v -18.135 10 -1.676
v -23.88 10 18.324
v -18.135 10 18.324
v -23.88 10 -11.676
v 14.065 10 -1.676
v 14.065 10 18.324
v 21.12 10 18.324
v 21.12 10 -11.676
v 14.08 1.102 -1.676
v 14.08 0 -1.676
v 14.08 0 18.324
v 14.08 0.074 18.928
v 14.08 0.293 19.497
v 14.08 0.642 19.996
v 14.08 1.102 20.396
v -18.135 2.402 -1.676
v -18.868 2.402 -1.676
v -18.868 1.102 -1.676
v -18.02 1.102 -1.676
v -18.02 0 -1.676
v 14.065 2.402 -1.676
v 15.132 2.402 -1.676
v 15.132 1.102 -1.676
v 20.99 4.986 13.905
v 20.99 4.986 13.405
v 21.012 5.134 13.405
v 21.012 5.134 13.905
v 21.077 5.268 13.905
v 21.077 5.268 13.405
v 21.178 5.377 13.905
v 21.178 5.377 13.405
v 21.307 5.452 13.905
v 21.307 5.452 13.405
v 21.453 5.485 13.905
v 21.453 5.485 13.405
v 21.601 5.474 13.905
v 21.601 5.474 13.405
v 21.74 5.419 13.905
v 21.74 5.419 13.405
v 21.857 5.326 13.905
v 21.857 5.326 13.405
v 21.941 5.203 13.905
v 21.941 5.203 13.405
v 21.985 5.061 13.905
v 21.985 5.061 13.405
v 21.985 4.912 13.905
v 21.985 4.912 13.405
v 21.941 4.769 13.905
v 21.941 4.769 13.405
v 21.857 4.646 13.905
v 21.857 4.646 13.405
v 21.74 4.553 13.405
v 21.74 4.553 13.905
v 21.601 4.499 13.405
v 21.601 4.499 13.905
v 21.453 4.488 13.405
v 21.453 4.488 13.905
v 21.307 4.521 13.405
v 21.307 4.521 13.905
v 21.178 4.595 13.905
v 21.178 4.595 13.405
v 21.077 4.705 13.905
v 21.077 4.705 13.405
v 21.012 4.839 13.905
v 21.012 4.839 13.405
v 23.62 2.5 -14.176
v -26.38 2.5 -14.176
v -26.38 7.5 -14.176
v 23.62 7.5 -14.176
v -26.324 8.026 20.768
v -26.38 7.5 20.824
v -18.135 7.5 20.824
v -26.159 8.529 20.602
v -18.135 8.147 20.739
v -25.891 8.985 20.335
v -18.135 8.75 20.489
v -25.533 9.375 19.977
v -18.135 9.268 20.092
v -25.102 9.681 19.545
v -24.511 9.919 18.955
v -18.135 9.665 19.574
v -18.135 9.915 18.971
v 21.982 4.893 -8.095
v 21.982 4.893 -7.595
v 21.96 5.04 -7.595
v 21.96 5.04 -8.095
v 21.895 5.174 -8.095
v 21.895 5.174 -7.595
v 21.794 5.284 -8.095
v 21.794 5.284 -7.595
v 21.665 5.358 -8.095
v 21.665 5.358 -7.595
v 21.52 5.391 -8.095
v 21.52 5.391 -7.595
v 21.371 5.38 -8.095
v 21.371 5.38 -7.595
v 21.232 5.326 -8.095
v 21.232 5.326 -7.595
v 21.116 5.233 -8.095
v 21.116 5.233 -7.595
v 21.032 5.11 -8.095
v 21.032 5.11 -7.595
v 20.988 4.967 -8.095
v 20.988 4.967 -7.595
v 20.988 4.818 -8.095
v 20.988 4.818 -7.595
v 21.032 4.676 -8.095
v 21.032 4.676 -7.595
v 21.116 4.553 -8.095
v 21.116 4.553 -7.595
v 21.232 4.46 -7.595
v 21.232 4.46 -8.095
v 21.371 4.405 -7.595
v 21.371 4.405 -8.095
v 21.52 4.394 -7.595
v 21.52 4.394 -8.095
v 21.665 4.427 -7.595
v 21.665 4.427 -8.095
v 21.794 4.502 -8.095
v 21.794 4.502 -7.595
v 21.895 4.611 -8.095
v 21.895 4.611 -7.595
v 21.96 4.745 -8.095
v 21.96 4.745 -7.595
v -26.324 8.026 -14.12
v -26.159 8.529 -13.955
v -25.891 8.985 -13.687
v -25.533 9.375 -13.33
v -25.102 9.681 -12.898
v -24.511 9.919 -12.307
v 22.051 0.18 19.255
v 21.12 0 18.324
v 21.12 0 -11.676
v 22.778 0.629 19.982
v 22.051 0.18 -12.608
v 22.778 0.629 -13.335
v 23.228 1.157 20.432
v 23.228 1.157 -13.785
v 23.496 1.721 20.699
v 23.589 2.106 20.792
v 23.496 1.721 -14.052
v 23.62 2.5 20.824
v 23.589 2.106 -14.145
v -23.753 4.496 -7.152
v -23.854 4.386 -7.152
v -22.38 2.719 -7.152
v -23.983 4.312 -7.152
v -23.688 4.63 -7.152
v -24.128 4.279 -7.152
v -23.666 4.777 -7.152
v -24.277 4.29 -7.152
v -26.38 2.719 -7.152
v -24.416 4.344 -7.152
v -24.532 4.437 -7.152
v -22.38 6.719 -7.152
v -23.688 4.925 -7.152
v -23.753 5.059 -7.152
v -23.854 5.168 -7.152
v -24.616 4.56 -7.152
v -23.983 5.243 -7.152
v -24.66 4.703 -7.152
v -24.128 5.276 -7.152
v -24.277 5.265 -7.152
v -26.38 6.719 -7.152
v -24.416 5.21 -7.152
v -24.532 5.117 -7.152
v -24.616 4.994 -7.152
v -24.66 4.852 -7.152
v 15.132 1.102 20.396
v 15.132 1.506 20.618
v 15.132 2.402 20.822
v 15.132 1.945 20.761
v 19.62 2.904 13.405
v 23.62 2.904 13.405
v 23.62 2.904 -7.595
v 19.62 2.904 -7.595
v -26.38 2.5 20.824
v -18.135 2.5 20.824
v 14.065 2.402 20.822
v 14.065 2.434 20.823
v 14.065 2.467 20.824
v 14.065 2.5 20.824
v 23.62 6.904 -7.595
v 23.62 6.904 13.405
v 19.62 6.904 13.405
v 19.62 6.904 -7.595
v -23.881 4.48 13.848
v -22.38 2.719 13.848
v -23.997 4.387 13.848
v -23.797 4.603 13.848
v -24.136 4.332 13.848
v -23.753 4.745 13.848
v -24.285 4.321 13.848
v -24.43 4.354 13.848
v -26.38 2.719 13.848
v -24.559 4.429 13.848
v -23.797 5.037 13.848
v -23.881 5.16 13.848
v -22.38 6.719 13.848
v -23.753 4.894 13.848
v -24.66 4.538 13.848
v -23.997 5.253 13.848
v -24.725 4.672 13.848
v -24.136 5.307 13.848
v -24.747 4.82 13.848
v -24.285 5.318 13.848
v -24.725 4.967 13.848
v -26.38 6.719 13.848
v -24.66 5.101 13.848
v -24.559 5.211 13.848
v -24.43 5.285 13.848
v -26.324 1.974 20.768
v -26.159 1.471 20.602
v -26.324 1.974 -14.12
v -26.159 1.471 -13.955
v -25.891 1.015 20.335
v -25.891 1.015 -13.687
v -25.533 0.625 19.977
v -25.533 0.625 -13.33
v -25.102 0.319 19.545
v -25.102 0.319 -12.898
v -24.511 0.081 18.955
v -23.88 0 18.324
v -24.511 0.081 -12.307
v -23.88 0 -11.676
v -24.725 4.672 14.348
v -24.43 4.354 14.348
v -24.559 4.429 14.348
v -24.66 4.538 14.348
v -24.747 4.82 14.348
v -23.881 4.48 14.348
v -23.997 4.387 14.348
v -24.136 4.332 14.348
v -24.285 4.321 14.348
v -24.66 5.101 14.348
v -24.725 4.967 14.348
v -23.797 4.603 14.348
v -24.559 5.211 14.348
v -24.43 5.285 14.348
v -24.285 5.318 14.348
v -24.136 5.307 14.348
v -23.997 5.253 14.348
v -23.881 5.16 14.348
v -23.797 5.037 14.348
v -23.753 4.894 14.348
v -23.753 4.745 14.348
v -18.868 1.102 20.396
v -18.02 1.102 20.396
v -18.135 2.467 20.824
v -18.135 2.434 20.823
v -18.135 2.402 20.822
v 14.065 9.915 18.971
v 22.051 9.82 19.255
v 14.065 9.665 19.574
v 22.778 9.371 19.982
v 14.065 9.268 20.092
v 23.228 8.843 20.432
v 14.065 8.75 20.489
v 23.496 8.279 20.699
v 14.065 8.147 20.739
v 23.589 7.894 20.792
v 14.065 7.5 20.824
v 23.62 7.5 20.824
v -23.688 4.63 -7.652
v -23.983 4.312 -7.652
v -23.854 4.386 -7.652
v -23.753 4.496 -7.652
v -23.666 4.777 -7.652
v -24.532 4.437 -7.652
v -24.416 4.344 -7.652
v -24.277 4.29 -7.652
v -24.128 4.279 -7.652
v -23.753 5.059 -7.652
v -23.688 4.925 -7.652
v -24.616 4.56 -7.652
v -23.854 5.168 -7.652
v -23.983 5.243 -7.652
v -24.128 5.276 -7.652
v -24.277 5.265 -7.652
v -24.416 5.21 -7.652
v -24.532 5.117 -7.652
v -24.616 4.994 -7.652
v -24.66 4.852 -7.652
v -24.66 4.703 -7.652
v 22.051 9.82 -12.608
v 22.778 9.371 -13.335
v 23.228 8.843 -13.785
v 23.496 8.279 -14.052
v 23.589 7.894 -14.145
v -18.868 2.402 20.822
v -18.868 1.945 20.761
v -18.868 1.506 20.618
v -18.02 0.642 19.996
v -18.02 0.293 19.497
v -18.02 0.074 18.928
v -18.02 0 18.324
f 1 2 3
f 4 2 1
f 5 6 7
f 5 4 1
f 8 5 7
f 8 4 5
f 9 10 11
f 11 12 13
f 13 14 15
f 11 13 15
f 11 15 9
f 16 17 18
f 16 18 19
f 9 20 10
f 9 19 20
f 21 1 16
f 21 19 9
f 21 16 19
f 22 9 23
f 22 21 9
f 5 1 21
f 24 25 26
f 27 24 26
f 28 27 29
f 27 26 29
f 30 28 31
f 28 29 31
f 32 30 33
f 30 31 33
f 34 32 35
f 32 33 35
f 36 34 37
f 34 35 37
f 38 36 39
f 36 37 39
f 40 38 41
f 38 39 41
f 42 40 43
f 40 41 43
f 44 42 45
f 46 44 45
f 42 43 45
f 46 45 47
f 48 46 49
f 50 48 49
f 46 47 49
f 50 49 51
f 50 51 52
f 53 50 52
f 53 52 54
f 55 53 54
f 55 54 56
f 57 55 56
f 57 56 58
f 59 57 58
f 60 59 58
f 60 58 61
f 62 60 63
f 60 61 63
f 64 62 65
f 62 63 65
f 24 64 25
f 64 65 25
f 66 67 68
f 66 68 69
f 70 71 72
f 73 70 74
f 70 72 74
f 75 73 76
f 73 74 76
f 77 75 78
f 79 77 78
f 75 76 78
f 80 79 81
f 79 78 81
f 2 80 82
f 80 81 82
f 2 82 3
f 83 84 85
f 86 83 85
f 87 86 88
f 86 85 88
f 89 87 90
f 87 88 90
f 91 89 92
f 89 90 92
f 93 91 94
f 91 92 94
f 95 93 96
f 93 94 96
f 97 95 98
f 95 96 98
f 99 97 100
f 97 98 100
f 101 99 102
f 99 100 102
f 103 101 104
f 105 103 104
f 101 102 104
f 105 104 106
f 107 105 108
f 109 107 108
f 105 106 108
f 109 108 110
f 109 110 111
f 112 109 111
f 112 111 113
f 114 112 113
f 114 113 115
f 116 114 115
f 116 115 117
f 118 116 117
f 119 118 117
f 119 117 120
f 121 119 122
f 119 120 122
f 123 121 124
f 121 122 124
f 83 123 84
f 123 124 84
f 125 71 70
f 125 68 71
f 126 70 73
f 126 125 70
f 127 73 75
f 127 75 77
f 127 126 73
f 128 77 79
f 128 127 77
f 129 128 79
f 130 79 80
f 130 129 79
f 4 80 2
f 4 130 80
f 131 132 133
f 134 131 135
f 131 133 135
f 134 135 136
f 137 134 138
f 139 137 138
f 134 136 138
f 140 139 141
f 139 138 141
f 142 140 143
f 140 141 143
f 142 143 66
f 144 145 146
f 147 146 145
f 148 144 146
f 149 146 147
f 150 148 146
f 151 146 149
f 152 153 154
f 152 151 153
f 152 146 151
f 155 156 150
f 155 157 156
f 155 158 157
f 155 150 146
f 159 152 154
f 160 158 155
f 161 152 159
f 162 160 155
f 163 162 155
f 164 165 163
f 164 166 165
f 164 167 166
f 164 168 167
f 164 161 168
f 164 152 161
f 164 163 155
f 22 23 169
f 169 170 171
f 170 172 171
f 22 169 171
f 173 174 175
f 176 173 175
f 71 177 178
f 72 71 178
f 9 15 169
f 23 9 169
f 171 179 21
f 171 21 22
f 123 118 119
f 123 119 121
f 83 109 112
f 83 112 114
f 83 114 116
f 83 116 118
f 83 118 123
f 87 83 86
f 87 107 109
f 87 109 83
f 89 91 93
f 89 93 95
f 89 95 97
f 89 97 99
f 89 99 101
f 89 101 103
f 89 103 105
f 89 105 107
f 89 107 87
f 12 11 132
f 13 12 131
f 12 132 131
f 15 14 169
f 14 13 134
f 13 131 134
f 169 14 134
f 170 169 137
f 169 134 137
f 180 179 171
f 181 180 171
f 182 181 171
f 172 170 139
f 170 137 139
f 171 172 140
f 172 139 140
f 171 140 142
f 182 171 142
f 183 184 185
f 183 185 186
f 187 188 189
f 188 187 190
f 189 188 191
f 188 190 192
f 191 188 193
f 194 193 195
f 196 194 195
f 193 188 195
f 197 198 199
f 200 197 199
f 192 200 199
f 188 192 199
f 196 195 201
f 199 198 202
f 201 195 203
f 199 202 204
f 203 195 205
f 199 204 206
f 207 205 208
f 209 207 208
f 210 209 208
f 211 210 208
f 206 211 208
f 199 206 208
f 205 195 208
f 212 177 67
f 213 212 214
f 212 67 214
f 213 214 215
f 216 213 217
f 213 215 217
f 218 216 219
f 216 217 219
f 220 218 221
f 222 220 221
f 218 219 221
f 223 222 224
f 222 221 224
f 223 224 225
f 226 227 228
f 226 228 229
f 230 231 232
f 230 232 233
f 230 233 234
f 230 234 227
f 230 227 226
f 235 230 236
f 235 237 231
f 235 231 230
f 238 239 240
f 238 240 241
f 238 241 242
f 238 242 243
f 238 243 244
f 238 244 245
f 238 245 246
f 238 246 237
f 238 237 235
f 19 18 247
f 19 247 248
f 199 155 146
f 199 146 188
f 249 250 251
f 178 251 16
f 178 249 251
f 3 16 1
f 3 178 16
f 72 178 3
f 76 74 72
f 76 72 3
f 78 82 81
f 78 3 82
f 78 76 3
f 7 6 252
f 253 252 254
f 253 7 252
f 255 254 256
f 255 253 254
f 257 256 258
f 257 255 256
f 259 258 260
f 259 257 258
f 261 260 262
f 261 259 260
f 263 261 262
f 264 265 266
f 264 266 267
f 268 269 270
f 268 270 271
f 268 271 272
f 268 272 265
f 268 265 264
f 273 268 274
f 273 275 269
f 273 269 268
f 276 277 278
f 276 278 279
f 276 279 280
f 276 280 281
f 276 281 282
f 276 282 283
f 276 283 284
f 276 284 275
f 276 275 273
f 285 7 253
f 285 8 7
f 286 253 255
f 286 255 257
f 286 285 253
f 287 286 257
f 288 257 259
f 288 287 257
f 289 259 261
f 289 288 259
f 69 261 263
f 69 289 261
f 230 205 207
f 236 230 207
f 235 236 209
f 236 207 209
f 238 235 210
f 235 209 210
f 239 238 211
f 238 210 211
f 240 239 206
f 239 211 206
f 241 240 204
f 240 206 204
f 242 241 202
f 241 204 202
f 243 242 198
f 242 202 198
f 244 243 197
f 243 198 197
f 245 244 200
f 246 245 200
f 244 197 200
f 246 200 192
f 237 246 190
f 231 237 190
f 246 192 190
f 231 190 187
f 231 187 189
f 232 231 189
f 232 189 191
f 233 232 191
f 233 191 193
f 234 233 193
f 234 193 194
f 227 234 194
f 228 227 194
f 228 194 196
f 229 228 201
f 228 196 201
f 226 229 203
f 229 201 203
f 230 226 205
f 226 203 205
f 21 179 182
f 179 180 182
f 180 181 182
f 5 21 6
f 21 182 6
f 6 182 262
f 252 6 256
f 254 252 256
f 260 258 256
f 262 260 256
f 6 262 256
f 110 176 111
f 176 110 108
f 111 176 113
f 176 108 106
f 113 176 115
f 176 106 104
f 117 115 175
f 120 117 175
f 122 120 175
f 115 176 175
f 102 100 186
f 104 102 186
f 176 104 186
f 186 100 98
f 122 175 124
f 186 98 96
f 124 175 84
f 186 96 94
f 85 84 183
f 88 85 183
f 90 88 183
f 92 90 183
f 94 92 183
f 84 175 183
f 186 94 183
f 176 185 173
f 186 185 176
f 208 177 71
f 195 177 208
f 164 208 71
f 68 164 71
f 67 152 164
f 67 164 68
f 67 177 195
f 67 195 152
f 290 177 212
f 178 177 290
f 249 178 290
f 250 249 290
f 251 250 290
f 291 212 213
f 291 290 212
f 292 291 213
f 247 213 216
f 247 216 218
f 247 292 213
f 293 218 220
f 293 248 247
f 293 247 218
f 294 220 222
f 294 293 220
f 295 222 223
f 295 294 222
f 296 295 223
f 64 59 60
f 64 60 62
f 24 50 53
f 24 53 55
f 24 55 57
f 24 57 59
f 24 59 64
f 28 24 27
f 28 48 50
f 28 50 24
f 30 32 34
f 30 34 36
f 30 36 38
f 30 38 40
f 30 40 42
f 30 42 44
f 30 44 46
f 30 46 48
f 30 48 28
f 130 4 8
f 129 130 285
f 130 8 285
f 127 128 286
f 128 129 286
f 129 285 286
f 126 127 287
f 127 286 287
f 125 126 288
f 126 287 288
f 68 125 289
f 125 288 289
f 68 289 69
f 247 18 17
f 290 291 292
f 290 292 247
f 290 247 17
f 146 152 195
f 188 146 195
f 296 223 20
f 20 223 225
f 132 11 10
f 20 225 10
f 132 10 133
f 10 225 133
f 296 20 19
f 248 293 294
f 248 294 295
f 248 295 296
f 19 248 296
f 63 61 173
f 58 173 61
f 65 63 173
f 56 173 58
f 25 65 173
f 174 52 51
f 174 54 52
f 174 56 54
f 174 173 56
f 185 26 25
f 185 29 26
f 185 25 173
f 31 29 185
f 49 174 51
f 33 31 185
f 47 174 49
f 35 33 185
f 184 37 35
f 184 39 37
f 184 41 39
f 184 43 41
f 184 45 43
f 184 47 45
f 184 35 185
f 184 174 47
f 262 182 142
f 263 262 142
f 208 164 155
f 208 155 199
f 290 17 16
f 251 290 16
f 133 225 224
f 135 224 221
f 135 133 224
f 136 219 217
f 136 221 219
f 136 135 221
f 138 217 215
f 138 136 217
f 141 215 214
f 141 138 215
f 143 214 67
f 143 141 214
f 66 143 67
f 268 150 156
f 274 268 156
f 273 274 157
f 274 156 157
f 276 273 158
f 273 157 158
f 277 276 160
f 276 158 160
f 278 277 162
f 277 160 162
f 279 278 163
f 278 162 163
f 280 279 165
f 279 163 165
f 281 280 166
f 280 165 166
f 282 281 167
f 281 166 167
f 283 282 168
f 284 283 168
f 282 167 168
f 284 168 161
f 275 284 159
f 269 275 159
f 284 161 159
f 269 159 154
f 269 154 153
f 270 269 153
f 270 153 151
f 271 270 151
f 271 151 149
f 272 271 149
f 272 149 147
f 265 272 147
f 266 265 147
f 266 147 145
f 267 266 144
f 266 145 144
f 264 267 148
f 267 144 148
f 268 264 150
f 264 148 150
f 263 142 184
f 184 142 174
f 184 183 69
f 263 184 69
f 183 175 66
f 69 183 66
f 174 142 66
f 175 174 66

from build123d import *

# Parameters (mm, degrees)
SKETCH1_W           = 50
SKETCH1_H           = 35
BOSS_EXTRUDE1_DEPTH = 10
SKETCH2_W           = 34
SKETCH2_H           = 1.3
CUT_EXTRUDE1_DEPTH  = 22.5
SKETCH3_W           = 15
SKETCH3_H           = 7.598280995
CUT_EXTRUDE2_DEPTH  = 22.5
SKETCH4_W           = 17.2
SKETCH4_H           = 7.598280995
CUT_EXTRUDE3_DEPTH  = 22.5
SKETCH5_W           = 13.5
SKETCH5_H           = 1.101719005
CUT_EXTRUDE4_DEPTH  = 22.5
SKETCH6_W           = 18.6
SKETCH6_H           = 1.101719005
CUT_EXTRUDE5_DEPTH  = 22.5
SKETCH7_W           = 21
SKETCH7_H           = 4
CUT_EXTRUDE6_DEPTH  = 4
SKETCH8_R           = 0.5
CUT_EXTRUDE7_DEPTH  = 0.5
SKETCH9_R           = 0.5
CUT_EXTRUDE8_DEPTH  = 0.5
SKETCH10_W          = 21
SKETCH10_H          = 4
CUT_EXTRUDE9_DEPTH  = 4
SKETCH11_R          = 0.5
CUT_EXTRUDE10_DEPTH = 0.5
SKETCH12_R          = 0.5
CUT_EXTRUDE11_DEPTH = 0.5
FILLET1_R           = 2.5


with BuildPart() as part:
    # Sketch1 → Boss-Extrude1 (new body)
    with BuildSketch(Plane(origin=(0, 0, 0), x_dir=(1, 0, 0), z_dir=(0, 1, 0))):
        with Locations((-1.379996057, -3.323754789)):
            Rectangle(SKETCH1_W, SKETCH1_H)
    extrude(amount=BOSS_EXTRUDE1_DEPTH)

    # Sketch2 → Cut-Extrude1 (cut)
    with BuildSketch(Plane.XY.offset(20.823754789)):
        with Locations((-1.867795916, 1.751719005)):
            Rectangle(SKETCH2_W, SKETCH2_H)
    extrude(amount=-CUT_EXTRUDE1_DEPTH, mode=Mode.SUBTRACT)

    # Sketch3 → Cut-Extrude2 (cut)
    with BuildSketch(Plane.XY.offset(20.823754789)):
        with Locations((6.564825068, 6.200859503)):
            Rectangle(SKETCH3_W, SKETCH3_H)
    extrude(amount=-CUT_EXTRUDE2_DEPTH, mode=Mode.SUBTRACT)

    # Sketch4 → Cut-Extrude3 (cut)
    with BuildSketch(Plane.XY.offset(20.823754789)):
        with Locations((-9.535174932, 6.200859503)):
            Rectangle(SKETCH4_W, SKETCH4_H)
    extrude(amount=-CUT_EXTRUDE3_DEPTH, mode=Mode.SUBTRACT)

    # Sketch5 → Cut-Extrude4 (cut)
    with BuildSketch(Plane.XY.offset(20.823754789)):
        with Locations((7.329591682, 0.550859503)):
            Rectangle(SKETCH5_W, SKETCH5_H)
    extrude(amount=-CUT_EXTRUDE4_DEPTH, mode=Mode.SUBTRACT)

    # Sketch6 → Cut-Extrude5 (cut)
    with BuildSketch(Plane.XY.offset(20.823754789)):
        with Locations((-8.720408318, 0.550859503)):
            Rectangle(SKETCH6_W, SKETCH6_H)
    extrude(amount=-CUT_EXTRUDE5_DEPTH, mode=Mode.SUBTRACT)

    # Sketch7 → Cut-Extrude6 (cut)
    with BuildSketch(Plane.ZY.offset(26.379996057)):
        with Locations((3.348440288, 4.718765764)):
            Rectangle(SKETCH7_W, SKETCH7_H)
    extrude(amount=-CUT_EXTRUDE6_DEPTH, mode=Mode.SUBTRACT)

    # Sketch8 → Cut-Extrude7 (cut)
    with BuildSketch(Plane.XY.offset(-7.151559712)):
        with Locations((-24.165741094, 4.777186657)):
            Circle(SKETCH8_R)
    extrude(amount=-CUT_EXTRUDE7_DEPTH, mode=Mode.SUBTRACT)

    # Sketch9 → Cut-Extrude8 (cut)
    with BuildSketch(Plane(origin=(0, 0, 13.848440288), x_dir=(-1, 0, 0), z_dir=(0, 0, -1))):
        with Locations((24.247358315, 4.819765538)):
            Circle(SKETCH9_R)
    extrude(amount=-CUT_EXTRUDE8_DEPTH, mode=Mode.SUBTRACT)

    # Sketch10 → Cut-Extrude9 (cut)
    with BuildSketch(Plane(origin=(23.620003943, 0, 0), x_dir=(0, 0, -1), z_dir=(1, 0, 0))):
        with Locations((-2.904513536, 4.904491876)):
            Rectangle(SKETCH10_W, SKETCH10_H)
    extrude(amount=-CUT_EXTRUDE9_DEPTH, mode=Mode.SUBTRACT)

    # Sketch11 → Cut-Extrude10 (cut)
    with BuildSketch(Plane(origin=(0, 0, 13.404513536), x_dir=(-1, 0, 0), z_dir=(0, 0, -1))):
        with Locations((-21.490093602, 4.986179228)):
            Circle(SKETCH11_R)
    extrude(amount=-CUT_EXTRUDE10_DEPTH, mode=Mode.SUBTRACT)

    # Sketch12 → Cut-Extrude11 (cut)
    with BuildSketch(Plane.XY.offset(-7.595486464)):
        with Locations((21.482332732, 4.892682942)):
            Circle(SKETCH12_R)
    extrude(amount=-CUT_EXTRUDE11_DEPTH, mode=Mode.SUBTRACT)

    # Fillet1
    fillet1_edges = [part.edges().sort_by_distance(p)[0] for p in [
        (-22.200202188, 0, 20.823754789),
        (18.849797812, 0, 20.823754789),
        (-26.379996057, 0, 3.323754789),
        (-26.379996057, 10, 3.323754789),
        (-22.257585495, 10, 20.823754789),
        (18.842414505, 10, 20.823754789),
        (-1.379996057, 0, -14.176245211),
        (-1.379996057, 10, -14.176245211),
        (23.620003943, 0, 3.323754789),
        (23.620003943, 10, 3.323754789),
    ]]
    fillet(fillet1_edges, radius=FILLET1_R)


solid = part.part
